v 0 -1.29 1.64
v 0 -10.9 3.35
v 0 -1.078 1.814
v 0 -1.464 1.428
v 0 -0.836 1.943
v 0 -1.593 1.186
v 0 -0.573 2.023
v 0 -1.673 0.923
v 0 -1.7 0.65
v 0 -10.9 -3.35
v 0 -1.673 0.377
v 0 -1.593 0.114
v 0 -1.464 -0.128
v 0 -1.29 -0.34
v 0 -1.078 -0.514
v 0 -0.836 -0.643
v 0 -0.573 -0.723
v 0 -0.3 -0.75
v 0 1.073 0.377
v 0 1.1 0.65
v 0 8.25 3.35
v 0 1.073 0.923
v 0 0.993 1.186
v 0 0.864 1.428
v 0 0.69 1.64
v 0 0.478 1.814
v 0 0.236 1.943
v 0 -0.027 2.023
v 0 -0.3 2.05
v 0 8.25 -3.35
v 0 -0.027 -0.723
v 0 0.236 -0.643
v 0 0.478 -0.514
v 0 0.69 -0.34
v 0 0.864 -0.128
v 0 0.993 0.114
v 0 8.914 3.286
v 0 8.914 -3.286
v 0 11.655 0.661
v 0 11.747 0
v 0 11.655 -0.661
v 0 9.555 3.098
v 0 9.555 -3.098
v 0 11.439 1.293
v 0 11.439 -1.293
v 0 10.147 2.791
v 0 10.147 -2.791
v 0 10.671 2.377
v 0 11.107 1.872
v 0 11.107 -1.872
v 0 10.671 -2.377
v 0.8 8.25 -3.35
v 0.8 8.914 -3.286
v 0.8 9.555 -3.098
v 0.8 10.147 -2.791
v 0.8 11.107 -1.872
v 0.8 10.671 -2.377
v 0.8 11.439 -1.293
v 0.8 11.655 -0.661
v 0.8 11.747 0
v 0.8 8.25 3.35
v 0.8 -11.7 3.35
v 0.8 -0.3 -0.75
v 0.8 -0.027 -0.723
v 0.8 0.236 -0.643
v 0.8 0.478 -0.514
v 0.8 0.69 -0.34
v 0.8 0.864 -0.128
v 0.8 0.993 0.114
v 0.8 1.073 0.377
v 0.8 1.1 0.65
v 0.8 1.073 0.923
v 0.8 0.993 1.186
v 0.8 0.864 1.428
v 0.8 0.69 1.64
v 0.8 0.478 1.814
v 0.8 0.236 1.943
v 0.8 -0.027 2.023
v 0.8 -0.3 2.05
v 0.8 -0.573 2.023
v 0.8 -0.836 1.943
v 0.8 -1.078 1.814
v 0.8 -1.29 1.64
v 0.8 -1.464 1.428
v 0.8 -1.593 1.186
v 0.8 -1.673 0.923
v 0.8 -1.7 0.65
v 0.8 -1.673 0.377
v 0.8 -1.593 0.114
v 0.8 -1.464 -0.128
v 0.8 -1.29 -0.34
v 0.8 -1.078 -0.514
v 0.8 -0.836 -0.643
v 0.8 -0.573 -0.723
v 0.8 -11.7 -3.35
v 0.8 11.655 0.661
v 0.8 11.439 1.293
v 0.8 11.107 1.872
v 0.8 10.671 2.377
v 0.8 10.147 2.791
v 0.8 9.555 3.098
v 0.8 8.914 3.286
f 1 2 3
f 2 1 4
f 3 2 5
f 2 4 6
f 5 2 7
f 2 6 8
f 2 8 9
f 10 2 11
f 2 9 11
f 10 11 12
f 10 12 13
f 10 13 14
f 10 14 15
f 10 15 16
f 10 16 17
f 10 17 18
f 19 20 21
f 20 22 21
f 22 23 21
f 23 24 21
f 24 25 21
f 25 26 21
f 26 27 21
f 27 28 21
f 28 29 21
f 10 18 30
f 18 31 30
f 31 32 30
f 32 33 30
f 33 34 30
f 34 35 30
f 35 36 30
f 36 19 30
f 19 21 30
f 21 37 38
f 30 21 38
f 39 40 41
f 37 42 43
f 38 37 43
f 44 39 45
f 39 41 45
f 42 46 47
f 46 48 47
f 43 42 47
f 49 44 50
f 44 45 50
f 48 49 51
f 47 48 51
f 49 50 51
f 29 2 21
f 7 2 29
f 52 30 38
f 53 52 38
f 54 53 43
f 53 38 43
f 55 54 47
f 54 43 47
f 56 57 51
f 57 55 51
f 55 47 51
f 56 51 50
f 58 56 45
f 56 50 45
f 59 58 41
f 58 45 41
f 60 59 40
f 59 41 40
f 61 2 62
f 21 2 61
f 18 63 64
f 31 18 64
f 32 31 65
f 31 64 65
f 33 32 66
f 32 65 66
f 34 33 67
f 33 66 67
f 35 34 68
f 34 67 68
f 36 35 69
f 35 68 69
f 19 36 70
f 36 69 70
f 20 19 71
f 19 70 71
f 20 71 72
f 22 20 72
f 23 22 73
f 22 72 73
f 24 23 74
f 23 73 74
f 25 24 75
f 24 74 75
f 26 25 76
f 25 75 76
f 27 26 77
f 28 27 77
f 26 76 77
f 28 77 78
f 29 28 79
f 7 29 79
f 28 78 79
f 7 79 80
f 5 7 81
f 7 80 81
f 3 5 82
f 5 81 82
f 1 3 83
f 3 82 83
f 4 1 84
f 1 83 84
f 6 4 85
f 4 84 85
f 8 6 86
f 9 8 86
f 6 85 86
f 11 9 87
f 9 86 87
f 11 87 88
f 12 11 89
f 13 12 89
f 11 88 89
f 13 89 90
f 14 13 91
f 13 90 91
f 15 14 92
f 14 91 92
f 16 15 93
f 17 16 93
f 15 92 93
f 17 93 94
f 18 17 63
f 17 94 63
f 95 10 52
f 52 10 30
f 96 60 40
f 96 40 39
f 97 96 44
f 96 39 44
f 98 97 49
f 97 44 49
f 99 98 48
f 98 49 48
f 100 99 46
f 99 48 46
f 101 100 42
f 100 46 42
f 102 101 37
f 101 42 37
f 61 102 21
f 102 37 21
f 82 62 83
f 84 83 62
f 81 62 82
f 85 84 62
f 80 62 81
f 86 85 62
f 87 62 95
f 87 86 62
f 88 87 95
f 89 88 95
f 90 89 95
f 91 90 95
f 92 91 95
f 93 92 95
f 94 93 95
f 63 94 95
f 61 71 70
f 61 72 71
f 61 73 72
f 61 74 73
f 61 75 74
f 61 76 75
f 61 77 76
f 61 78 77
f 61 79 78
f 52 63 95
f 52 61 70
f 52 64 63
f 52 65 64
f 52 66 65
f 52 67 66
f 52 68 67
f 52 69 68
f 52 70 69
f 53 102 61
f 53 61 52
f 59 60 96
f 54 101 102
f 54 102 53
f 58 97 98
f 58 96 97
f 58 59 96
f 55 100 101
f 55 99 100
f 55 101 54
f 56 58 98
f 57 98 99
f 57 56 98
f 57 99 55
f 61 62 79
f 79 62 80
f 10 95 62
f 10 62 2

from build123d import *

# Parameters (mm, degrees)
SKETCH2_W           = 6.7
SKETCH2_H           = 23.5
BOSS_EXTRUDE2_DEPTH = 0.8
CHAMFER1_SIZE       = 0.85
FILLET2_R           = 3.5
SKETCH6_R           = 1.4
CUT_EXTRUDE1_DEPTH  = 0.8


with BuildPart() as part:
    # Sketch2 → Boss-Extrude2 (new body)
    with BuildSketch(Plane(origin=(0, 0, 0), x_dir=(0, 0, -1), z_dir=(1, 0, 0))):
        Rectangle(SKETCH2_W, SKETCH2_H)
    extrude(amount=BOSS_EXTRUDE2_DEPTH)

    # Chamfer1
    # the kernel refuses this chamfer: 0.85 mm, written as the material it takes off along each edge
    with BuildSketch(Plane(origin=(0, -11.75, -5.53593054), x_dir=(0.9996219169112968, -0.02749587661058583, 0), z_dir=(0, 0, 1))) as chamfer1_piece_1:
        Polygon((CHAMFER1_SIZE * 0.999621916911, CHAMFER1_SIZE * 0.0274958766106), (-CHAMFER1_SIZE * 0.0274958766106, CHAMFER1_SIZE * 0.999621916911), (0, 0), align=None)
    extrude(amount=11.07186108, mode=Mode.SUBTRACT)

    # Fillet2
    # the kernel refuses this fillet: 3.5 mm, written as the material it takes off along each edge
    with BuildSketch(Plane(origin=(-8.75, 11.75, -3.35), x_dir=(0, -1, 0), z_dir=(1, 0, 0)), Plane(origin=(-8.75, 11.75, 3.35), x_dir=(0, 0, -1), z_dir=(1, 0, 0))) as fillet2_piece_1:
        with BuildLine():
            CenterArc((FILLET2_R, -FILLET2_R), FILLET2_R, 90, 90)
            Line((0, -FILLET2_R), (0, 0))
            Line((0, 0), (FILLET2_R, 0))
        make_face()
    extrude(amount=18.3, mode=Mode.SUBTRACT)

    # Sketch6 → Cut-Extrude1 (cut)
    with BuildSketch(Plane(origin=(0.8, 0, 0), x_dir=(0, 0, -1), z_dir=(1, 0, 0))):
        with Locations((-0.65, -0.3)):
            Circle(SKETCH6_R)
    extrude(amount=-CUT_EXTRUDE1_DEPTH, mode=Mode.SUBTRACT)


solid = part.part
